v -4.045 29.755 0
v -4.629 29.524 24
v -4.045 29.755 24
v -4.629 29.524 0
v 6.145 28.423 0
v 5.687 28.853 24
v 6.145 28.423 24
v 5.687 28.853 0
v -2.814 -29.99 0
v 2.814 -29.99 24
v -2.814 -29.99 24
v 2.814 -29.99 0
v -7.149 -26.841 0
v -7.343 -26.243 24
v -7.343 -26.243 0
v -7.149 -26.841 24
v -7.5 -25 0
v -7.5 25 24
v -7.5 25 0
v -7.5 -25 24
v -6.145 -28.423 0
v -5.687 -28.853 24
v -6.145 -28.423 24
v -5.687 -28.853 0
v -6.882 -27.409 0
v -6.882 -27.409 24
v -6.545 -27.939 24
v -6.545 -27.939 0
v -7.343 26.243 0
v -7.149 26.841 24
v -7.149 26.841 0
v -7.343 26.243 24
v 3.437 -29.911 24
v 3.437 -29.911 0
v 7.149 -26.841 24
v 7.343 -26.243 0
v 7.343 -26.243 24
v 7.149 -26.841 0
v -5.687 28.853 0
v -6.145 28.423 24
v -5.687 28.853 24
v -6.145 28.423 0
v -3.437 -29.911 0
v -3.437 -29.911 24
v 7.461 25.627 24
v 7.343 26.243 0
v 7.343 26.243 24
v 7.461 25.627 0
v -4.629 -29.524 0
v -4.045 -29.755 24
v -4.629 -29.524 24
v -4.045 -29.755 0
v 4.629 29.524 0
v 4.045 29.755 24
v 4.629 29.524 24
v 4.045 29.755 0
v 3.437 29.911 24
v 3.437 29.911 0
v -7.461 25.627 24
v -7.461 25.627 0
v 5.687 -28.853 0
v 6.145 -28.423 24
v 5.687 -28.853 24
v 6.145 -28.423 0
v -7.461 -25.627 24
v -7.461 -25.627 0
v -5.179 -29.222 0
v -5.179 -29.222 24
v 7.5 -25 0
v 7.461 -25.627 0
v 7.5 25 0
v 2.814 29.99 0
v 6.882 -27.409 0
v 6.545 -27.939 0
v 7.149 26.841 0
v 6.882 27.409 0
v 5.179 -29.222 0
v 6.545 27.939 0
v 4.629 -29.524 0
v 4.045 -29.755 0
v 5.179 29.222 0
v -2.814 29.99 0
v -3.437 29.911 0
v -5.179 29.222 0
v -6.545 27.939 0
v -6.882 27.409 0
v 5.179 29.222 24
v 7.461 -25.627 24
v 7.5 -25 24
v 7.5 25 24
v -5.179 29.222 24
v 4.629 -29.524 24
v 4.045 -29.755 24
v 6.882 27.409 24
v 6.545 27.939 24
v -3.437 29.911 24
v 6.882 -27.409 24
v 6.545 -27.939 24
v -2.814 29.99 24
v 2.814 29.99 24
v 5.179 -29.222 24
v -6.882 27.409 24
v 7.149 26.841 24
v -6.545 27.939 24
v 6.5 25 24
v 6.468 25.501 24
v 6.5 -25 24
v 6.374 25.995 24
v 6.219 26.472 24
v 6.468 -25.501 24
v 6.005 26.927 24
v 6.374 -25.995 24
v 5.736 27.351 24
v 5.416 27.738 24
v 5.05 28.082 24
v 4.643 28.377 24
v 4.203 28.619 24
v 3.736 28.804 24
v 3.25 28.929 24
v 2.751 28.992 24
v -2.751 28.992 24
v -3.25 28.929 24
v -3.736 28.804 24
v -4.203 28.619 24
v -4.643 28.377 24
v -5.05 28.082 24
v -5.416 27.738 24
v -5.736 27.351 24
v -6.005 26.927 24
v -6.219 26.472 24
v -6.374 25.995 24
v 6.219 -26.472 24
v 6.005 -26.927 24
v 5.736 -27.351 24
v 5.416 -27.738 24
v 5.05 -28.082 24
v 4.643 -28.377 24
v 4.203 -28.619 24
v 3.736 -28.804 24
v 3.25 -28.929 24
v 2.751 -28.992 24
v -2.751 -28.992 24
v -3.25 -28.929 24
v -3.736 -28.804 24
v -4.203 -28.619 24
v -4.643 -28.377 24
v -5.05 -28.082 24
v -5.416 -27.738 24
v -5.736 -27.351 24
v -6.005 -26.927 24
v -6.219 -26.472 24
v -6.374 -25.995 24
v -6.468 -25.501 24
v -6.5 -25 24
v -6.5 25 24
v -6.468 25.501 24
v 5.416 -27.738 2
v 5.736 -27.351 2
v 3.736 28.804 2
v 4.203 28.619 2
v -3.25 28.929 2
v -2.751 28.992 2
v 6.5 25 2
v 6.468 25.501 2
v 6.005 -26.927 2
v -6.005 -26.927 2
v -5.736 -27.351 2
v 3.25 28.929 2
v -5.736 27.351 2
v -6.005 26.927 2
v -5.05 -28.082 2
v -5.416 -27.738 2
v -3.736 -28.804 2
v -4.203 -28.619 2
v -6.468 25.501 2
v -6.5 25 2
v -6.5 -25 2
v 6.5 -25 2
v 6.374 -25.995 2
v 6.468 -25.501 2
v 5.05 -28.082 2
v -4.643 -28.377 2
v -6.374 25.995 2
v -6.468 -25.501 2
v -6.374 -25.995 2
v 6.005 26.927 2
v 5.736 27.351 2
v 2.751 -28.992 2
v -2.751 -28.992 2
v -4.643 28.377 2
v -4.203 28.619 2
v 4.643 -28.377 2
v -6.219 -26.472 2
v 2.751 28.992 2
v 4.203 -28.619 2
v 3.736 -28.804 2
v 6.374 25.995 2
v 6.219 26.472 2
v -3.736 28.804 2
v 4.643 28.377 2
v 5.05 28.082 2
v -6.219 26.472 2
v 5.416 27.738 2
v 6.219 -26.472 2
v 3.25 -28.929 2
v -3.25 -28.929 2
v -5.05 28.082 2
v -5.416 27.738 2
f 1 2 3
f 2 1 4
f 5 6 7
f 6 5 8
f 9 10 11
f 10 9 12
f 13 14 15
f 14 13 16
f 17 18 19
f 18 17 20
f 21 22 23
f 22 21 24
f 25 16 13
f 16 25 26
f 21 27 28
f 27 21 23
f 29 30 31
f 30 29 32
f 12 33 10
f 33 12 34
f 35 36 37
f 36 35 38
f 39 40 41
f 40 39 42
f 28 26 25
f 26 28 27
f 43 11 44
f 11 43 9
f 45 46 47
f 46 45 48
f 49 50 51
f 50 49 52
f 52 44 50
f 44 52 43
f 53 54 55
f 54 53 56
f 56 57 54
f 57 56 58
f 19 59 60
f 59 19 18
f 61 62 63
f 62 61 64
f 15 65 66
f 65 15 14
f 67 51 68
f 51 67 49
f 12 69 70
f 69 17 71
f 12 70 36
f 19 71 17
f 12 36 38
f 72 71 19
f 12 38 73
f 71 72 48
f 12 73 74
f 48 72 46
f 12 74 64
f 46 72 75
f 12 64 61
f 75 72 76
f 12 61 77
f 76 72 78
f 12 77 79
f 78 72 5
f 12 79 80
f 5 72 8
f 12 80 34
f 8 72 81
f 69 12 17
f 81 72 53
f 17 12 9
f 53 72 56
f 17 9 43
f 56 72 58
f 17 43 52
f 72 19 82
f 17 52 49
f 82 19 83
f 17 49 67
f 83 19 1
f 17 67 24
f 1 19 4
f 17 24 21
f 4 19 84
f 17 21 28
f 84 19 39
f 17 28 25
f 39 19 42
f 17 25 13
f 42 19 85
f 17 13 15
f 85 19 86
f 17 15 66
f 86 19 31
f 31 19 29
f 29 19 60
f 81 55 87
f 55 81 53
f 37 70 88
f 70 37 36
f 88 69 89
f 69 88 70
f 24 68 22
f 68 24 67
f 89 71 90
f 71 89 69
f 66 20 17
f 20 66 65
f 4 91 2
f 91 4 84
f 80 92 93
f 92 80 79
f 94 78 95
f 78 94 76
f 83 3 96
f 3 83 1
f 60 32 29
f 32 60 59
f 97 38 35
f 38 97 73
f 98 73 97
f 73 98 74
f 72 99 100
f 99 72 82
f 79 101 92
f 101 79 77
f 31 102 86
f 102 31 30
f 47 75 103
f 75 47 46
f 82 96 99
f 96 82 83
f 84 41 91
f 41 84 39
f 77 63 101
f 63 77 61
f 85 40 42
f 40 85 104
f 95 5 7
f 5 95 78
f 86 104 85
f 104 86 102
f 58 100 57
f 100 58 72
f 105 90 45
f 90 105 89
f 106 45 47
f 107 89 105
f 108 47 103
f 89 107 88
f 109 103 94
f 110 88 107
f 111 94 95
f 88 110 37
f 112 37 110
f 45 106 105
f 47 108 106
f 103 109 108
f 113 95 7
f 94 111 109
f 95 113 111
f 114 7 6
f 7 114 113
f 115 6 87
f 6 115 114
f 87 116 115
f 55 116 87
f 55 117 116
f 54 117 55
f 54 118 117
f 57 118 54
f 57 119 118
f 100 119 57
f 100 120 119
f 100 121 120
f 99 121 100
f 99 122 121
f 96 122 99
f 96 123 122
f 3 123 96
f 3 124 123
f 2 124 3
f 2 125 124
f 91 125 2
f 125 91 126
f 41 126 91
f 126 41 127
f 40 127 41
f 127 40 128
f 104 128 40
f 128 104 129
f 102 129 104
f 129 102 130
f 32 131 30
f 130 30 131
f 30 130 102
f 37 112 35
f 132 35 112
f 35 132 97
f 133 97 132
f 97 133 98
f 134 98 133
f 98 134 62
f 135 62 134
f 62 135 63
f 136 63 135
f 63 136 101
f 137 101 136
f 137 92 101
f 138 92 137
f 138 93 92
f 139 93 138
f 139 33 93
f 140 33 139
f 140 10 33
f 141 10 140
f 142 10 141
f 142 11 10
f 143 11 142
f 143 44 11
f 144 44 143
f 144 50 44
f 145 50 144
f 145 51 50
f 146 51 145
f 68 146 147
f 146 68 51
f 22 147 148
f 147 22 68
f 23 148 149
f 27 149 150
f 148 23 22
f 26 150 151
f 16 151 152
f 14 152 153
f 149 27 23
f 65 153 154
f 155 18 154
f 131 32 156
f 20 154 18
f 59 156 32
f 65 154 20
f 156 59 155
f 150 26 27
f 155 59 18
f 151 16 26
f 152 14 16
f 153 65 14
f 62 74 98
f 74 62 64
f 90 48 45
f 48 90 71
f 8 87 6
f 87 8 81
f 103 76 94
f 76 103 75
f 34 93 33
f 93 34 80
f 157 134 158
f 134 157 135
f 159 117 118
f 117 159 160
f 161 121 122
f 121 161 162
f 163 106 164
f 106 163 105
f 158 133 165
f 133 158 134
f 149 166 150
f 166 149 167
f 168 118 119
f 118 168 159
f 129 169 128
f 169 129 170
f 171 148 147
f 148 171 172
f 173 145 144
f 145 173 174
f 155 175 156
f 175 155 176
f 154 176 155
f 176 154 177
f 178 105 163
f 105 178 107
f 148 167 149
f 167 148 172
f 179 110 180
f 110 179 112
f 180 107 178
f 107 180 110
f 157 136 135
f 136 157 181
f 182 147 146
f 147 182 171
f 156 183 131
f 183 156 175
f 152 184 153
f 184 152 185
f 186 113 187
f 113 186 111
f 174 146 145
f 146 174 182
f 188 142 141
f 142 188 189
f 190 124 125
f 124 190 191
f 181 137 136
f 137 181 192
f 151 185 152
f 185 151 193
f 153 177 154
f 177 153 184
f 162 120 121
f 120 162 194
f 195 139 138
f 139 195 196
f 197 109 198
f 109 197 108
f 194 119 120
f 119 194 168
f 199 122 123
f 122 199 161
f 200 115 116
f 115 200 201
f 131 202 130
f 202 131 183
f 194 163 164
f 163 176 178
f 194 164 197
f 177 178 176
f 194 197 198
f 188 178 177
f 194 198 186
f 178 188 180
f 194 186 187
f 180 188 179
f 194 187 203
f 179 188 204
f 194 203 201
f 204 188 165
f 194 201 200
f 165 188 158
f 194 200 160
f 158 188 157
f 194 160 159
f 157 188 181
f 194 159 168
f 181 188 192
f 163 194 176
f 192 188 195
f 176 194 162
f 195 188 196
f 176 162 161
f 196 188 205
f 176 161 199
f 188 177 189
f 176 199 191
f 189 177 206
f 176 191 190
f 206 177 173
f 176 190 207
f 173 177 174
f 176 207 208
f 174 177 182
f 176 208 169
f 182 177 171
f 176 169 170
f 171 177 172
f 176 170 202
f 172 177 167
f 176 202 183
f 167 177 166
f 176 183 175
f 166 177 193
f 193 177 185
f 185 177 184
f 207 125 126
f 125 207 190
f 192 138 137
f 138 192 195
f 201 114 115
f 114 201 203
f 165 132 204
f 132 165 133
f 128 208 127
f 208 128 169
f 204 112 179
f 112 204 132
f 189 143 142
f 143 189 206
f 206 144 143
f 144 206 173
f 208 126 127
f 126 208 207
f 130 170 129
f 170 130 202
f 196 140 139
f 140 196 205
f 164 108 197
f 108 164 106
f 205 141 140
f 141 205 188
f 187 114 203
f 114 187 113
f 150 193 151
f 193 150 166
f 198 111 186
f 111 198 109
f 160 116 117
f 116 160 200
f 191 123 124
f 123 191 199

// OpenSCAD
$fn = 50;


difference() {
	union() {
		hull() {
			translate(v = [-2.5000000000, 25.0000000000, 0]) {
				cylinder(h = 24, r = 5);
			}
			translate(v = [2.5000000000, 25.0000000000, 0]) {
				cylinder(h = 24, r = 5);
			}
			translate(v = [-2.5000000000, -25.0000000000, 0]) {
				cylinder(h = 24, r = 5);
			}
			translate(v = [2.5000000000, -25.0000000000, 0]) {
				cylinder(h = 24, r = 5);
			}
		}
	}
	union() {
		translate(v = [0, 0, 2]) {
			hull() {
				translate(v = [-2.5000000000, 25.0000000000, 0]) {
					cylinder(h = 22, r = 4);
				}
				translate(v = [2.5000000000, 25.0000000000, 0]) {
					cylinder(h = 22, r = 4);
				}
				translate(v = [-2.5000000000, -25.0000000000, 0]) {
					cylinder(h = 22, r = 4);
				}
				translate(v = [2.5000000000, -25.0000000000, 0]) {
					cylinder(h = 22, r = 4);
				}
			}
		}
	}
}
